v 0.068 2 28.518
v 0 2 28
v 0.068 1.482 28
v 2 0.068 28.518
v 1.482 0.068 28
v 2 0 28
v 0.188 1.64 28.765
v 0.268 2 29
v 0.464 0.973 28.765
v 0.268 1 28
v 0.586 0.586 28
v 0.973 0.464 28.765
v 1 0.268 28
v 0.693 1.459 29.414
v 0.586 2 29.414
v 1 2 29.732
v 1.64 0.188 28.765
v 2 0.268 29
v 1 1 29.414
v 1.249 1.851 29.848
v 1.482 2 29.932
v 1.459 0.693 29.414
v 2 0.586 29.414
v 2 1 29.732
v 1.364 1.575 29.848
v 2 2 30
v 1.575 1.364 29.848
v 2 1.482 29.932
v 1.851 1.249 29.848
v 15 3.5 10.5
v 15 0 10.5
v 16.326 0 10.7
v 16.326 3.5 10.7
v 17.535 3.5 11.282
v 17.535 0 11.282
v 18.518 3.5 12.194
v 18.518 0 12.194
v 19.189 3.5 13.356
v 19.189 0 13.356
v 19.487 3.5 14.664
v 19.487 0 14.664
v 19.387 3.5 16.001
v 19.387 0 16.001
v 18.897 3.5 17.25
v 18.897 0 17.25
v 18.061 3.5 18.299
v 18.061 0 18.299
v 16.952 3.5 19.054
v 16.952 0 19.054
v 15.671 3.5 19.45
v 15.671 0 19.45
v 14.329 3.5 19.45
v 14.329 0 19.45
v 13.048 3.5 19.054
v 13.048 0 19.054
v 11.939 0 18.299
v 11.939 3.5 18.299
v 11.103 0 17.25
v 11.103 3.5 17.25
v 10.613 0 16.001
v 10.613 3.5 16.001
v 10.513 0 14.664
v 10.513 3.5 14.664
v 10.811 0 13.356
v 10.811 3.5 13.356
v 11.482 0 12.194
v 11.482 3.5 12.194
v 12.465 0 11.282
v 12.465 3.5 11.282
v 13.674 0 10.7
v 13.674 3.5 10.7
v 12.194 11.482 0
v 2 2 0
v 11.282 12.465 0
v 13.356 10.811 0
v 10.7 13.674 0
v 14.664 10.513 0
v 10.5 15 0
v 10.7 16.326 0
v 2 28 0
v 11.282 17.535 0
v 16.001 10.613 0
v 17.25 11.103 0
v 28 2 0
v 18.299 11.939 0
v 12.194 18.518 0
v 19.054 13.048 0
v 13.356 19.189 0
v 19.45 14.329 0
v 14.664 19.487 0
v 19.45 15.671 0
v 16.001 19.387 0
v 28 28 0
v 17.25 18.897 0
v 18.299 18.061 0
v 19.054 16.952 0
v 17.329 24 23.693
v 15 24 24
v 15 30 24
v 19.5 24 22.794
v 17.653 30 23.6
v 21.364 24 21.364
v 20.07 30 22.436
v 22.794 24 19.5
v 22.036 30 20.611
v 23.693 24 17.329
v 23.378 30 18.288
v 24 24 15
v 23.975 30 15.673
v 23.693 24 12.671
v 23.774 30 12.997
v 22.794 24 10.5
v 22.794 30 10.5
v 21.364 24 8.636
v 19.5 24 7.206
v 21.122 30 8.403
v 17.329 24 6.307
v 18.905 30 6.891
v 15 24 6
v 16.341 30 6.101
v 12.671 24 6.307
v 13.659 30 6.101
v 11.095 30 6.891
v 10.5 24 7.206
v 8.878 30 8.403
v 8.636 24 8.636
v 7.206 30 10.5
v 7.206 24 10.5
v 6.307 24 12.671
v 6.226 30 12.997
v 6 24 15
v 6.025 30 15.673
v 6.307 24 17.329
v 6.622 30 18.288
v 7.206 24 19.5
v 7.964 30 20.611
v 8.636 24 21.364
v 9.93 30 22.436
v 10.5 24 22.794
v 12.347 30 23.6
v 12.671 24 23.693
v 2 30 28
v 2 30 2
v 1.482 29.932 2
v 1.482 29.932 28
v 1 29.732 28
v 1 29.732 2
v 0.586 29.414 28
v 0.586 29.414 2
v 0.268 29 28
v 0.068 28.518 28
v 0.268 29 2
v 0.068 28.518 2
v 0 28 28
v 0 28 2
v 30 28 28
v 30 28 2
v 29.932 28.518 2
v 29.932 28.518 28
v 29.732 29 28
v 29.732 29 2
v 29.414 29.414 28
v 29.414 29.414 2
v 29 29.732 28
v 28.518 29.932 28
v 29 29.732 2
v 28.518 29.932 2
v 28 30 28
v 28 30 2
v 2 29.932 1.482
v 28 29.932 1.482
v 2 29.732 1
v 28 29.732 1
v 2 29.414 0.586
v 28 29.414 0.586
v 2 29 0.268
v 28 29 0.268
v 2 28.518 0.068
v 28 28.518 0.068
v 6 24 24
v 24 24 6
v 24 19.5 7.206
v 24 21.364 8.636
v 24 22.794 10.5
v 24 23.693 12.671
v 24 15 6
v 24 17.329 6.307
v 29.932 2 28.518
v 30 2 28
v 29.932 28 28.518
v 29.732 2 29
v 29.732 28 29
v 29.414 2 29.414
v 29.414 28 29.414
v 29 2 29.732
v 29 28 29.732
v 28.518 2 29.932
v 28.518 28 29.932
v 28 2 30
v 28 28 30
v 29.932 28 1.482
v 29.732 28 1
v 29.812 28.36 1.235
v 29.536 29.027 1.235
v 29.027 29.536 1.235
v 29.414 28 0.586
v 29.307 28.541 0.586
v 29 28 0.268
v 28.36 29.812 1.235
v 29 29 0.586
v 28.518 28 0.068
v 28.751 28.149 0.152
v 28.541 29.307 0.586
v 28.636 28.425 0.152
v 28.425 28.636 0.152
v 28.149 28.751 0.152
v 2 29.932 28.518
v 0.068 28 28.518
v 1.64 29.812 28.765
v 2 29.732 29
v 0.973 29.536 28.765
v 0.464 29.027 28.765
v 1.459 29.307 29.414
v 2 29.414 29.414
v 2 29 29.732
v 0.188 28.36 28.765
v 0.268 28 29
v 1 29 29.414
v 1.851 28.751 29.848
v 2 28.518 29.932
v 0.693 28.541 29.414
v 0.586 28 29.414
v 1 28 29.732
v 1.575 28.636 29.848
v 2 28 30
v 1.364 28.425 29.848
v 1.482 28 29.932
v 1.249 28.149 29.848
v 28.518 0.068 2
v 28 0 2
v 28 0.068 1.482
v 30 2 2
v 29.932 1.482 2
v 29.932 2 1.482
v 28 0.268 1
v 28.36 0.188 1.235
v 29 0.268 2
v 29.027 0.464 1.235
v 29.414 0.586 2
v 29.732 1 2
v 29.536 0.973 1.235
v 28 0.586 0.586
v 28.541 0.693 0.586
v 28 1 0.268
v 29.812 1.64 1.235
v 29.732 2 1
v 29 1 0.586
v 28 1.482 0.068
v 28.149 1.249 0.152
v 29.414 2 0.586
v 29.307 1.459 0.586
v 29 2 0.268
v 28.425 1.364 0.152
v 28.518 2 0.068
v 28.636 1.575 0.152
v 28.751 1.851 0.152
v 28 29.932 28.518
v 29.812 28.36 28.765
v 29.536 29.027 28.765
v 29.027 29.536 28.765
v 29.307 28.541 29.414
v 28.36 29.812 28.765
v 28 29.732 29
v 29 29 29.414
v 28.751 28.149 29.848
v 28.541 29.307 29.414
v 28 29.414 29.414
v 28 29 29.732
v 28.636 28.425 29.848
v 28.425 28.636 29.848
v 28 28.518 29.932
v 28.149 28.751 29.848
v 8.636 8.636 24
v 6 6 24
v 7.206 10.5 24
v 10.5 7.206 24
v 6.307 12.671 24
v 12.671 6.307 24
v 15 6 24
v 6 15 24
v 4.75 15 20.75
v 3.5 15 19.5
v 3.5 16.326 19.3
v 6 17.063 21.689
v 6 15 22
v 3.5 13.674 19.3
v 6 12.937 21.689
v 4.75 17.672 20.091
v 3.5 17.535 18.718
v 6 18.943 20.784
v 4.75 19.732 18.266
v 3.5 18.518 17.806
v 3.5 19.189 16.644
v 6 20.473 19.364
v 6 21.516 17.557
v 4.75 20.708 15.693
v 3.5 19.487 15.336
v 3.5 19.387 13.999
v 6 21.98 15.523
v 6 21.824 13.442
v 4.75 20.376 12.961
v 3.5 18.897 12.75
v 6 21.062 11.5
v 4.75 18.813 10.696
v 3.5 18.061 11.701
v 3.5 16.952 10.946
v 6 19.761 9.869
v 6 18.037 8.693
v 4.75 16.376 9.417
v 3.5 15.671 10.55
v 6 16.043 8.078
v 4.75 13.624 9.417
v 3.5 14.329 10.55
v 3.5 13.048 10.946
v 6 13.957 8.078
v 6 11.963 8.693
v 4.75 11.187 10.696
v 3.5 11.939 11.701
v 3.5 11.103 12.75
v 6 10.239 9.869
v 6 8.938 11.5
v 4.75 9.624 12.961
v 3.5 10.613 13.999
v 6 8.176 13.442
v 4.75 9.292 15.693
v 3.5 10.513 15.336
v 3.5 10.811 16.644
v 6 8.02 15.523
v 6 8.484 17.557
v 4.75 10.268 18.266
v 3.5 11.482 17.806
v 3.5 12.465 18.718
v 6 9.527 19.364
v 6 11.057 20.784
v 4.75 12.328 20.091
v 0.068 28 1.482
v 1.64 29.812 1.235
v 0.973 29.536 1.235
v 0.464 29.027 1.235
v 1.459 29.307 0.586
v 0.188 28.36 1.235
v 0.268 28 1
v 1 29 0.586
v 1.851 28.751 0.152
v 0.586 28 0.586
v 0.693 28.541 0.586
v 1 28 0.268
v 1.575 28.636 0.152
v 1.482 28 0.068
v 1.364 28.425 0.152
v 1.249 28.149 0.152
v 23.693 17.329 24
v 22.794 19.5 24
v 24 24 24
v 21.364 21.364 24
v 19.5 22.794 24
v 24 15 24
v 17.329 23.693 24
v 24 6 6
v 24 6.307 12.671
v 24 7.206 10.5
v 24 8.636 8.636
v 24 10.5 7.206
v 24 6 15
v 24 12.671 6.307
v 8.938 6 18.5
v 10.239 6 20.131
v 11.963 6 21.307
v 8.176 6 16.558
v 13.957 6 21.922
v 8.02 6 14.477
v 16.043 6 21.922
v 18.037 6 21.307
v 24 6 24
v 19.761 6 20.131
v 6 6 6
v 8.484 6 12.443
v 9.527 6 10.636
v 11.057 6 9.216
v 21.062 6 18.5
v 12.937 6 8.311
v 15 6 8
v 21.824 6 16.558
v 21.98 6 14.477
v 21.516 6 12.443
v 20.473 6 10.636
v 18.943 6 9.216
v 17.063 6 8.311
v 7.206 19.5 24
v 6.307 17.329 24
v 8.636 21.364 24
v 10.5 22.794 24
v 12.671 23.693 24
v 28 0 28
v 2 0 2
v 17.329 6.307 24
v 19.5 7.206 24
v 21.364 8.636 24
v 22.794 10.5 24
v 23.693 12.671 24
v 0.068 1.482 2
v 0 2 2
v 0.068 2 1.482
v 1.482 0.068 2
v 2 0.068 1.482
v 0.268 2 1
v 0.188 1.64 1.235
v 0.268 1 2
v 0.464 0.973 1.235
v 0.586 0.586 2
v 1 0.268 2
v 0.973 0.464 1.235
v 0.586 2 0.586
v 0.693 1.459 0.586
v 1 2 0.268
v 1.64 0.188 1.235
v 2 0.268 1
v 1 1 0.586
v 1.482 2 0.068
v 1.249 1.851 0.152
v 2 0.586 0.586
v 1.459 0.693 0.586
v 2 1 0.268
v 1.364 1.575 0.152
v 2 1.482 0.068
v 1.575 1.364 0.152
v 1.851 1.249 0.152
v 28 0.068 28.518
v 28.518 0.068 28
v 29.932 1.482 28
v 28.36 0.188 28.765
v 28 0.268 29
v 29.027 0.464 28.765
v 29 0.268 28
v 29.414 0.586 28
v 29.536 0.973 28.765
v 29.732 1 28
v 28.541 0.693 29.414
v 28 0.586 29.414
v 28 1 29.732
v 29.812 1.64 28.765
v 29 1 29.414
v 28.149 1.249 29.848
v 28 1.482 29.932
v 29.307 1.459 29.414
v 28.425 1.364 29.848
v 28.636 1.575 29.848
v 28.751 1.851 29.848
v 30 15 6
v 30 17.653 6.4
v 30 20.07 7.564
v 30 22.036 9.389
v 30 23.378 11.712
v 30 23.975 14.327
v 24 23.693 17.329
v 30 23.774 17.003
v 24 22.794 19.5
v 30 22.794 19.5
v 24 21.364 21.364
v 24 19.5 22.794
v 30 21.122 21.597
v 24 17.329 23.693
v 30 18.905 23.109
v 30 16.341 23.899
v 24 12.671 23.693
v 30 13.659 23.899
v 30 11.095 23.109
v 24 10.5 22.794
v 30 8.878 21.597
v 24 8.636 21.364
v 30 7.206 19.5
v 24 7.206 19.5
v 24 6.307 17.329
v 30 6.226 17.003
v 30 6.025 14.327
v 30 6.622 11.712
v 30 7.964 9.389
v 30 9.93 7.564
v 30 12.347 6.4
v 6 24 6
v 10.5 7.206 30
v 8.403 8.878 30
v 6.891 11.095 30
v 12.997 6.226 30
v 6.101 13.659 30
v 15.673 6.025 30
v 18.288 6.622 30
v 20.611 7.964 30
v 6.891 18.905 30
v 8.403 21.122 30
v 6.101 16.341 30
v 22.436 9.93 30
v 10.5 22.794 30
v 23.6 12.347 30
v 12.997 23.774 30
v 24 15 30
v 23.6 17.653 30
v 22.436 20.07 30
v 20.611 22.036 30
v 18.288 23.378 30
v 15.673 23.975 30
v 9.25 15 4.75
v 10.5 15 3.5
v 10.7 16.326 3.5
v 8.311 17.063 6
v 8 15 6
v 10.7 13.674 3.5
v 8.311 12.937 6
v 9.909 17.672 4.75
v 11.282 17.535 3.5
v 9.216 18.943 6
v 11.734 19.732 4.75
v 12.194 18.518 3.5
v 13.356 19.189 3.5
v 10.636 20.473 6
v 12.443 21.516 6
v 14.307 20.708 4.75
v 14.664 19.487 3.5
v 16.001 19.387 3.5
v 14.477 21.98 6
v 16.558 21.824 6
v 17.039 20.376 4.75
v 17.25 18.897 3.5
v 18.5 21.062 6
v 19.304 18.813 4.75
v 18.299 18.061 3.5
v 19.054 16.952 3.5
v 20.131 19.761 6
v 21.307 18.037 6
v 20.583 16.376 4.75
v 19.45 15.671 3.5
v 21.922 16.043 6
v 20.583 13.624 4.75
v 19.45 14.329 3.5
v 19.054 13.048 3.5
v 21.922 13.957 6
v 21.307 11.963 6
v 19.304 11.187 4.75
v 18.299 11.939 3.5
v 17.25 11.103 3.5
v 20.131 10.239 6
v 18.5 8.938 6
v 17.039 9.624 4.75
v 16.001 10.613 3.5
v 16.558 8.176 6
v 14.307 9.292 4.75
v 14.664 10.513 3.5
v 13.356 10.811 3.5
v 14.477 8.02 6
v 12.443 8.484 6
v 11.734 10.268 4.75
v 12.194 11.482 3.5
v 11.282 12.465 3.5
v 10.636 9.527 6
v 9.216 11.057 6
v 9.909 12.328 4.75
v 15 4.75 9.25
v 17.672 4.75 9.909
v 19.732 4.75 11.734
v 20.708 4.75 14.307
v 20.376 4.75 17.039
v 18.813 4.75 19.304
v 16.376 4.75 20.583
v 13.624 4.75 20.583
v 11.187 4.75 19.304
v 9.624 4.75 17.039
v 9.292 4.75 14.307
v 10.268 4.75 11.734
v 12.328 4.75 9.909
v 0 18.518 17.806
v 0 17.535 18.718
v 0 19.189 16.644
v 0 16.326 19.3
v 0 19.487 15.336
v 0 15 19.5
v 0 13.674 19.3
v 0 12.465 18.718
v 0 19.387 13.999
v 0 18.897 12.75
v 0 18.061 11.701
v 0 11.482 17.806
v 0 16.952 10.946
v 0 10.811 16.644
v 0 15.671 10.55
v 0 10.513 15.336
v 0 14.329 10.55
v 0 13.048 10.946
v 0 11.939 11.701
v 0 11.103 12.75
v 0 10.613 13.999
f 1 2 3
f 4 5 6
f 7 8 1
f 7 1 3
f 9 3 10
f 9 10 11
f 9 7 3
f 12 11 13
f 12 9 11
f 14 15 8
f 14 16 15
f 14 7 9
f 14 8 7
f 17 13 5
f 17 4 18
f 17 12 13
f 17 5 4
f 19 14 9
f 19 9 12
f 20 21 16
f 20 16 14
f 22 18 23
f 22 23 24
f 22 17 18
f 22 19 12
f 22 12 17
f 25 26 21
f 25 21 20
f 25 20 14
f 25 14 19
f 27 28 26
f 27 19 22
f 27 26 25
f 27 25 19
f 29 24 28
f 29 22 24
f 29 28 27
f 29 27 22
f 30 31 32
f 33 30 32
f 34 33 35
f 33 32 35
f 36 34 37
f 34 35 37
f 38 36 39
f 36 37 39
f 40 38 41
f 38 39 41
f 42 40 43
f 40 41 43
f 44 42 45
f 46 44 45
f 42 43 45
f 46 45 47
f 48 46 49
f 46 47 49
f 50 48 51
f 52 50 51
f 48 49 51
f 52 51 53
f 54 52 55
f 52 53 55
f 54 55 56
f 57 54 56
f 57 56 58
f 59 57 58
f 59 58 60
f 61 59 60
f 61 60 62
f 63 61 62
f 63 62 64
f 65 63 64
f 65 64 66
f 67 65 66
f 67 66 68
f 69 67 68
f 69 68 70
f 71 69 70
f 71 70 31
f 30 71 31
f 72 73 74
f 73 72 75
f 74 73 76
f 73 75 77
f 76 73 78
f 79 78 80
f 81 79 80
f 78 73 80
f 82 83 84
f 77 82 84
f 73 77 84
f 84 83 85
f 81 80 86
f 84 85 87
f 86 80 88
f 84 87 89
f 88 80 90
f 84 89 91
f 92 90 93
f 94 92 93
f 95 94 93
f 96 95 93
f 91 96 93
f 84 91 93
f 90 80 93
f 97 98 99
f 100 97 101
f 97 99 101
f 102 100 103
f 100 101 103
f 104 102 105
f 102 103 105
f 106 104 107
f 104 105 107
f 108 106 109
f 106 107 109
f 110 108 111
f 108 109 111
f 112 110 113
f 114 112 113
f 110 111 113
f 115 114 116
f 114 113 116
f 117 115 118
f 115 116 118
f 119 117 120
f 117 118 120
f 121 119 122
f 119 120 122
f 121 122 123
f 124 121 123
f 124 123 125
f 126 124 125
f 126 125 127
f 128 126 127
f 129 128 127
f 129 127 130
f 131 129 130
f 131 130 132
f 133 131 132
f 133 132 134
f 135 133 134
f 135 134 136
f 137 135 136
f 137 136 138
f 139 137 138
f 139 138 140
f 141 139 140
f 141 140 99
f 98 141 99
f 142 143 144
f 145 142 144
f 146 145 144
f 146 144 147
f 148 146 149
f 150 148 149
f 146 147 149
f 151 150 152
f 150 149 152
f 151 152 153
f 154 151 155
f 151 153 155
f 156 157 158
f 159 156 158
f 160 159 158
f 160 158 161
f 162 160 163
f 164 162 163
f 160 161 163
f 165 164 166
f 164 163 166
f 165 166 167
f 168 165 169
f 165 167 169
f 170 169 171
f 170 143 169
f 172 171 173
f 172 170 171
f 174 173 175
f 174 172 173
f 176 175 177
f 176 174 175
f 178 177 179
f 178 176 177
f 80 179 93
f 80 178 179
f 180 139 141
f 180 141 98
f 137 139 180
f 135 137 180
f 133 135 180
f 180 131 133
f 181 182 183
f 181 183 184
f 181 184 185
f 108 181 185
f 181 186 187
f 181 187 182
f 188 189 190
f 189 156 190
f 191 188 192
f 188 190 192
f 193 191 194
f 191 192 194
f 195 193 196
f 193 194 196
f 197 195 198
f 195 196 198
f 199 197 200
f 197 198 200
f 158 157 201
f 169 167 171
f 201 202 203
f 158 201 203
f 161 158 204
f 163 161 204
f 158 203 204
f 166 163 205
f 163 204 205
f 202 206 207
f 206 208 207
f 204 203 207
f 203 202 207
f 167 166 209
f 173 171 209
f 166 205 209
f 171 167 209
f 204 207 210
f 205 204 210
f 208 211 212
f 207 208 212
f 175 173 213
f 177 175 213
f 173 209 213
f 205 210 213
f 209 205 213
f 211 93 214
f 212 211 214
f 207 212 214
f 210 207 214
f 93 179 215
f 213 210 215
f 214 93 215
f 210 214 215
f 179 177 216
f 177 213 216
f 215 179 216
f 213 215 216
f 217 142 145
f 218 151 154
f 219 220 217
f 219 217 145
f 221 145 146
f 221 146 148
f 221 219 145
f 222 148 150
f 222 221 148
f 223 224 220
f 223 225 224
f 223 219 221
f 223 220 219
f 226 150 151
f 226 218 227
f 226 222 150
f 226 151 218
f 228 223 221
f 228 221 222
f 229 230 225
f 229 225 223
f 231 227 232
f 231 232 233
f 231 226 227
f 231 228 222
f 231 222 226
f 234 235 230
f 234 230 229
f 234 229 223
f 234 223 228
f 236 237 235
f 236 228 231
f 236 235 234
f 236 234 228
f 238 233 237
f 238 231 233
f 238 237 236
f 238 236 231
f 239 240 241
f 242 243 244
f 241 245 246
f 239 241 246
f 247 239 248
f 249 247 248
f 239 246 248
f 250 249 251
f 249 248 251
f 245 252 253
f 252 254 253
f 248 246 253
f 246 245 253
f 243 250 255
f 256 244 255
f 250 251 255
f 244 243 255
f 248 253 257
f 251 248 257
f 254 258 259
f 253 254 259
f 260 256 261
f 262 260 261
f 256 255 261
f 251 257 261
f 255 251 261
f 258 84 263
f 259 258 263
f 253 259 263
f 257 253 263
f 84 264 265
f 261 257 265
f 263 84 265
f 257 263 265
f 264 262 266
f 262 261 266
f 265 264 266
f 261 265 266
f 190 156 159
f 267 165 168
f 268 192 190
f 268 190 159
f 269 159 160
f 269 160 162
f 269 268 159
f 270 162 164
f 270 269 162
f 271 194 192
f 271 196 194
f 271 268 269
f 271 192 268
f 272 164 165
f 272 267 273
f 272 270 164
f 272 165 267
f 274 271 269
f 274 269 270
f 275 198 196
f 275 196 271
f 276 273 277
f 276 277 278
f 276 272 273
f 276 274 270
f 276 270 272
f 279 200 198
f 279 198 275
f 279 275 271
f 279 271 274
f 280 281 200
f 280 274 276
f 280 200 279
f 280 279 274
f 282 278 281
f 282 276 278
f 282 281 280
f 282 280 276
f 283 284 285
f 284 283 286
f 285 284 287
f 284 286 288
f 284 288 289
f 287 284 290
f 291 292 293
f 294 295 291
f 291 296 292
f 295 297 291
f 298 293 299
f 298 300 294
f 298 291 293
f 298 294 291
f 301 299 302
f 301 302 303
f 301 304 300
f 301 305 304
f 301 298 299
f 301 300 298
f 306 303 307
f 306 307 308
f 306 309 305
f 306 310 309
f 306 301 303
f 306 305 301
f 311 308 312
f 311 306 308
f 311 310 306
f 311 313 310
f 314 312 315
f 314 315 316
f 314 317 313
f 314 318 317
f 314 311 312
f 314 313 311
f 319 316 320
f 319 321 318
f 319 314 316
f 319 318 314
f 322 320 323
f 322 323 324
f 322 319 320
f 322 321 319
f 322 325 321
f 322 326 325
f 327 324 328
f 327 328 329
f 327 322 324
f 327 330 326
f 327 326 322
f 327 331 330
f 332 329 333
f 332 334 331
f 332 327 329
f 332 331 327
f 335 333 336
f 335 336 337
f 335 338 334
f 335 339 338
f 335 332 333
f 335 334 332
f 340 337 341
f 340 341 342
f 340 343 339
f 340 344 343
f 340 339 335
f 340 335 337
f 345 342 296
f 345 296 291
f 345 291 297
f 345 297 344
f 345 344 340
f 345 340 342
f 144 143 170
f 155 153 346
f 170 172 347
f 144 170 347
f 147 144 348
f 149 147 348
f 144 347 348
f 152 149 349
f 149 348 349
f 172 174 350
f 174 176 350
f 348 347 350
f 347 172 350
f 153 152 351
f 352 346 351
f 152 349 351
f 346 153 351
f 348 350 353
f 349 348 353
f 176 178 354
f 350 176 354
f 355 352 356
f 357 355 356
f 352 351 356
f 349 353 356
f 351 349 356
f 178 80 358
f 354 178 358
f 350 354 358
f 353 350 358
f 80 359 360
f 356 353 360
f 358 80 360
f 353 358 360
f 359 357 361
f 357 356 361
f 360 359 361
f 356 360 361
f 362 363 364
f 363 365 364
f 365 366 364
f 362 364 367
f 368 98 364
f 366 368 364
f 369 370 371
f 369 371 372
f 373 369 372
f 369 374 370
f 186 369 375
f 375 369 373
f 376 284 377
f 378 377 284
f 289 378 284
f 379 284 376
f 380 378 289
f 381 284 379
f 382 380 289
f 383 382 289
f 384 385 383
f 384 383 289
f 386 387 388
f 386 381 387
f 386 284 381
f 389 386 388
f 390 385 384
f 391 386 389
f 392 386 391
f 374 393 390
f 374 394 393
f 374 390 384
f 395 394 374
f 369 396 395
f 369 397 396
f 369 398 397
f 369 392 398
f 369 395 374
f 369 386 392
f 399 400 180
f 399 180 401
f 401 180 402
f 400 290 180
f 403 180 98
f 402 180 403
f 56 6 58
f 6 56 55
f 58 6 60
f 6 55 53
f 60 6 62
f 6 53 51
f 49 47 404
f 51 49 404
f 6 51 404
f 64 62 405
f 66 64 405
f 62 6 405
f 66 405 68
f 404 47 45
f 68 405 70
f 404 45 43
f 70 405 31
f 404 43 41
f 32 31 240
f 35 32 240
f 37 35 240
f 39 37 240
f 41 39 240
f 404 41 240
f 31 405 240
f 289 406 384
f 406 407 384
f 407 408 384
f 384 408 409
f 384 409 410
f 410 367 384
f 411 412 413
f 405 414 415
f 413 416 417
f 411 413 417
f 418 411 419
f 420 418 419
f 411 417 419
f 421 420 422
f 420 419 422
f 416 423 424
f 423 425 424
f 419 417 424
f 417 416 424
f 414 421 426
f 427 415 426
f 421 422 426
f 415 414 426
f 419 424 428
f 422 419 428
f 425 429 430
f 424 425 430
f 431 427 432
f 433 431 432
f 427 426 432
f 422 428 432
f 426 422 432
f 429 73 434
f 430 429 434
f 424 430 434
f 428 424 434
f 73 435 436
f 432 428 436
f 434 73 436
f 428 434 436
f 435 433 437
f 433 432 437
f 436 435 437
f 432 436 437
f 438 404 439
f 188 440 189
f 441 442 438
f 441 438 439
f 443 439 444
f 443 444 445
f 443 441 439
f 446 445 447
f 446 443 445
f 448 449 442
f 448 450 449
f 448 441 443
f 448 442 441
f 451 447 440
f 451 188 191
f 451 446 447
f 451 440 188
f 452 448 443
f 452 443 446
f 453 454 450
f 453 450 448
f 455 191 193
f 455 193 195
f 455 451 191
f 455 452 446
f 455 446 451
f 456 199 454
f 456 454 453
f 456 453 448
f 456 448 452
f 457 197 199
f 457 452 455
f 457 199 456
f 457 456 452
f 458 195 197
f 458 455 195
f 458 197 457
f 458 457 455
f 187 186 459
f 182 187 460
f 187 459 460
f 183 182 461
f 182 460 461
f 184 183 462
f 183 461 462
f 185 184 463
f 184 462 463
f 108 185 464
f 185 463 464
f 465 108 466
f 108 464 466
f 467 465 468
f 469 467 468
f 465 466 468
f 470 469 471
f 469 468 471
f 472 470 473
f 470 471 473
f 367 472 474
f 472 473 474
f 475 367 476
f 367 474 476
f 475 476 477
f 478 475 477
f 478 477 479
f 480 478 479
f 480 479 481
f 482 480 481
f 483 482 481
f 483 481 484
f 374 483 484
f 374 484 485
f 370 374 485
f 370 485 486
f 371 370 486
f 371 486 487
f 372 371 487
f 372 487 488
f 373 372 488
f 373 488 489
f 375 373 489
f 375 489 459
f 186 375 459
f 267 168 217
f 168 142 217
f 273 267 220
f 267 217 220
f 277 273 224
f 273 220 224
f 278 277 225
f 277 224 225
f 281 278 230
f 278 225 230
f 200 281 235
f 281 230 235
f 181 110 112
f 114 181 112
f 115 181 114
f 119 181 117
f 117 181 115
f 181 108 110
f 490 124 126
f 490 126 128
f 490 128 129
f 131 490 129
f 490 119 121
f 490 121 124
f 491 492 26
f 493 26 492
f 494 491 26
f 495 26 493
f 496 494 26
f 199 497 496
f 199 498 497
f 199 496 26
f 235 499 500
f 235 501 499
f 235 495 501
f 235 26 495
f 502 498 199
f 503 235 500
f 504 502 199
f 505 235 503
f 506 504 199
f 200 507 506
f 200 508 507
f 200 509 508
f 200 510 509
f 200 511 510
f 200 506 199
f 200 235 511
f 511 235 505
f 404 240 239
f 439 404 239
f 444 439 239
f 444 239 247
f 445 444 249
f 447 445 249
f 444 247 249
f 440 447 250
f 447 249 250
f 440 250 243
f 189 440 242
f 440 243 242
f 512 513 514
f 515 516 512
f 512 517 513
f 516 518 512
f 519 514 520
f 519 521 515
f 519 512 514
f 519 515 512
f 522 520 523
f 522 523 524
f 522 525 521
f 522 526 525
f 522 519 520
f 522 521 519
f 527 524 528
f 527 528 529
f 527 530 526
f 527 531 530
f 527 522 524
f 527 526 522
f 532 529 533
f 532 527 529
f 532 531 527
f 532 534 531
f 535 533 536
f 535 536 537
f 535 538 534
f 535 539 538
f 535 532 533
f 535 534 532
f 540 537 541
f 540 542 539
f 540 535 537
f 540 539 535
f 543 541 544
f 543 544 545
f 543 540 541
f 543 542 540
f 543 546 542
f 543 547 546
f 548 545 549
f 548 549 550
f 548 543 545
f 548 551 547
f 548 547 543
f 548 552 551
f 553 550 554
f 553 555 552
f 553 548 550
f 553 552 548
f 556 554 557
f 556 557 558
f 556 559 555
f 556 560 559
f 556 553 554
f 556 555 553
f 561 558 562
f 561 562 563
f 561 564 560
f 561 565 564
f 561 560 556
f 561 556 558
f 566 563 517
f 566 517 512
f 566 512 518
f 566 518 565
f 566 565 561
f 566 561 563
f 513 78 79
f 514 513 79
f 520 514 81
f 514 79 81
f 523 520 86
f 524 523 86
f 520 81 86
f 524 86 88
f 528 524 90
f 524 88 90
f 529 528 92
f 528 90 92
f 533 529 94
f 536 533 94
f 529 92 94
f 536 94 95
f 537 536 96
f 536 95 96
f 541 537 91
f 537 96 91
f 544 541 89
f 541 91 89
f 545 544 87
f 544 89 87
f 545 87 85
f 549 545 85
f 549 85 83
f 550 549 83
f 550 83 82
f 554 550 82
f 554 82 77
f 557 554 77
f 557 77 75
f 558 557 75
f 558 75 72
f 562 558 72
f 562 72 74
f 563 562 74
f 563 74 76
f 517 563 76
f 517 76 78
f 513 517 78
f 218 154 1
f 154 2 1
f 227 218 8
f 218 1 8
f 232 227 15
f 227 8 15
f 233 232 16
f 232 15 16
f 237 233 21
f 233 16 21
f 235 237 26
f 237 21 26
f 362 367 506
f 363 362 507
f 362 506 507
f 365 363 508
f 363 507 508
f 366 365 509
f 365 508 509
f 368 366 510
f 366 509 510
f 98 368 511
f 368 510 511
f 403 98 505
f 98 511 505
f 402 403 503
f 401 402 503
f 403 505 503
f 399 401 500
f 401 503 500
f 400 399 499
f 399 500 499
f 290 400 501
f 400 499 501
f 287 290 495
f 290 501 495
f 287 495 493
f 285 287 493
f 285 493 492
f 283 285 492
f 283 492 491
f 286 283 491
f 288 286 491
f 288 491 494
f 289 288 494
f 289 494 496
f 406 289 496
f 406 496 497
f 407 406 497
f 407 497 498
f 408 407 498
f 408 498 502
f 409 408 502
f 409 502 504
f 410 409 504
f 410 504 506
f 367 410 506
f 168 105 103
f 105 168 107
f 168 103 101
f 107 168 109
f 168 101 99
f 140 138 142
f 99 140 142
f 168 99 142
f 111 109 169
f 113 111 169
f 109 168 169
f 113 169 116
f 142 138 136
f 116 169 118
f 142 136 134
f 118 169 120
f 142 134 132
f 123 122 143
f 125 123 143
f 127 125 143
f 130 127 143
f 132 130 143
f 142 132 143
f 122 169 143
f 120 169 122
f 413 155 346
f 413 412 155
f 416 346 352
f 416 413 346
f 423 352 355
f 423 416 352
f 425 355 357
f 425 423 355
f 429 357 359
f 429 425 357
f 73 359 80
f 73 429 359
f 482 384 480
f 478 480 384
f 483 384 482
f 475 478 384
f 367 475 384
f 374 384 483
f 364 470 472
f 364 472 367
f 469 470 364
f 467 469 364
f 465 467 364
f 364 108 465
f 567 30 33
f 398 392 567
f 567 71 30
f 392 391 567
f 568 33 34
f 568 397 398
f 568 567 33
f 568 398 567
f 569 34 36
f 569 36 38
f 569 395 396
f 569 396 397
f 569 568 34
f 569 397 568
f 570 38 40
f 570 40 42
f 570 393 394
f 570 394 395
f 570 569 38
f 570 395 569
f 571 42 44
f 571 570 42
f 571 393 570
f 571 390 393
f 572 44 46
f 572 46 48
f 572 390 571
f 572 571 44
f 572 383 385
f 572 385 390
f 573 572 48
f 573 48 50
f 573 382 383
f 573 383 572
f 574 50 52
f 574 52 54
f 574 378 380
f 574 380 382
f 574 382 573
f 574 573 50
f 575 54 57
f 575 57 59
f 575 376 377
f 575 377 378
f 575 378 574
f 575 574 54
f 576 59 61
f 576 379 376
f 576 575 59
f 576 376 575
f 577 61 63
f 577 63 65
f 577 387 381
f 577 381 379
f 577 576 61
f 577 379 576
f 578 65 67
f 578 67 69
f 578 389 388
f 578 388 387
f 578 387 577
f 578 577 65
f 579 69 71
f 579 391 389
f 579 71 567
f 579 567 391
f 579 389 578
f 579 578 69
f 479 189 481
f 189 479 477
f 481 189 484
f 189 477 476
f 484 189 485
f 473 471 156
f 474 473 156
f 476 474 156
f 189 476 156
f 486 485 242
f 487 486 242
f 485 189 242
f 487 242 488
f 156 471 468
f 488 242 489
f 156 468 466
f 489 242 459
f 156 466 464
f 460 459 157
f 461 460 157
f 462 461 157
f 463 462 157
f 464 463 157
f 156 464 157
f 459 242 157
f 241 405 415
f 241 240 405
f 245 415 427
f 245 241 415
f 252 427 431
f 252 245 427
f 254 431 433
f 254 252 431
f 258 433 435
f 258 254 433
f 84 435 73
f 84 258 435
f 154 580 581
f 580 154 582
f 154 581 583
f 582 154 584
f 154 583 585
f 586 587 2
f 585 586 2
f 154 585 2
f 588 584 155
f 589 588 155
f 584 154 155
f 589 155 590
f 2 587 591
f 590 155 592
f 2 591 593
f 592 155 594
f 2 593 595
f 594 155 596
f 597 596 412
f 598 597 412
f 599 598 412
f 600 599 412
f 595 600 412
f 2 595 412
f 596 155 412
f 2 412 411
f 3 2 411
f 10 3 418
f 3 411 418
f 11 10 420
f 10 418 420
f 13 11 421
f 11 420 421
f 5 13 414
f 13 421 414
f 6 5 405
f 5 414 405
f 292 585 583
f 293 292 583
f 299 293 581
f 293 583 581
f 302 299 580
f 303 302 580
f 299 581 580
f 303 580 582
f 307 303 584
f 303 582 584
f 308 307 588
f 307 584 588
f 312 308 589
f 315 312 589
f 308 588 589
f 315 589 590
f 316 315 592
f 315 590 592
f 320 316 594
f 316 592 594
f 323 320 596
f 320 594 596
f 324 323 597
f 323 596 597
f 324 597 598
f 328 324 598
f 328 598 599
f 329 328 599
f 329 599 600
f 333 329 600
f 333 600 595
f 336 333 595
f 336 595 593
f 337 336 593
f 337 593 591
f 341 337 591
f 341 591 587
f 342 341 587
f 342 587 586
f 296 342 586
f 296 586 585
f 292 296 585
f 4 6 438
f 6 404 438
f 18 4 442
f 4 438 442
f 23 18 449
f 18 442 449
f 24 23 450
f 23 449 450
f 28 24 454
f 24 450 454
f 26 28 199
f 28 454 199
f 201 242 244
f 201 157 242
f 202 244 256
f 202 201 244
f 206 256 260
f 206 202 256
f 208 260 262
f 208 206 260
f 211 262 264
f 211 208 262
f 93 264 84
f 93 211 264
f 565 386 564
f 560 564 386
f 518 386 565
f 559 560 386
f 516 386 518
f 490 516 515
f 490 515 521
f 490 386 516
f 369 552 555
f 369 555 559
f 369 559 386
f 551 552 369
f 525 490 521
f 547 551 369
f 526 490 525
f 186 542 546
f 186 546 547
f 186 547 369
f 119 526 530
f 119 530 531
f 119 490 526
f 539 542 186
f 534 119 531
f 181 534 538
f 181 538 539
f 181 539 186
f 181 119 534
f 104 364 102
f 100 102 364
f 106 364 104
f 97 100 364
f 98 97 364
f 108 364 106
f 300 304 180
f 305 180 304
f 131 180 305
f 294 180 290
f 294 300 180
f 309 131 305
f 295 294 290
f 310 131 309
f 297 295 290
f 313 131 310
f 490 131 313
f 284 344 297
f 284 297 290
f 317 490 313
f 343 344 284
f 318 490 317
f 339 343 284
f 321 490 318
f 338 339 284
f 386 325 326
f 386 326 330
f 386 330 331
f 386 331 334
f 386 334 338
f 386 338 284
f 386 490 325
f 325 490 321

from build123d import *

# Parameters (mm, degrees)
BOSS_EXTRUDE1_DEPTH = 30
FILLET1_R           = 2
SHELL2_T            = 6
SKETCH3_R           = 9
CUT_EXTRUDE1_DEPTH  = 10
SKETCH4_R           = 9
CUT_EXTRUDE2_DEPTH  = 10
SKETCH5_R           = 9
CUT_EXTRUDE3_DEPTH  = 10
SKETCH7_R           = 4.5
CUT_EXTRUDE4_DEPTH  = 10
SKETCH8_R           = 4.5
CUT_EXTRUDE5_DEPTH  = 10
SKETCH9_R           = 4.5
CUT_EXTRUDE6_DEPTH  = 10
CHAMFER2_SIZE       = 2.5


with BuildPart() as part:
    # Sketch1 → Boss-Extrude1 (new body)
    with BuildSketch(Plane.XY):
        with BuildLine():
            Line((2, 0), (28, 0))
            ThreePointArc((28, 0), (29.414213562, 0.585786438), (30, 2))
            Line((30, 2), (30, 28))
            ThreePointArc((30, 28), (29.414213562, 29.414213562), (28, 30))
            Line((28, 30), (2, 30))
            ThreePointArc((2, 30), (0.585786438, 29.414213562), (0, 28))
            Line((0, 28), (0, 2))
            ThreePointArc((0, 2), (0.585786438, 0.585786438), (2, 0))
        make_face()
    extrude(amount=BOSS_EXTRUDE1_DEPTH)

    # Fillet1
    fillet1_edges = [part.edges().sort_by_distance(p)[0] for p in [
        (29.414213562, 0.585786438, 30),
        (15, 0, 0),
        (0.585786438, 0.585786438, 0),
        (30, 15, 30),
        (29.414213562, 29.414213562, 30),
        (15, 30, 30),
        (0.585786438, 29.414213562, 30),
        (0, 15, 30),
        (0.585786438, 0.585786438, 30),
        (15, 0, 30),
        (0, 15, 0),
        (0.585786438, 29.414213562, 0),
        (15, 30, 0),
        (29.414213562, 29.414213562, 0),
        (30, 15, 0),
        (29.414213562, 0.585786438, 0),
    ]]
    fillet(fillet1_edges, radius=FILLET1_R)

    # Shell2 (no face opened: a closed hollow body)
    add(offset(amount=-SHELL2_T, mode=Mode.PRIVATE), mode=Mode.SUBTRACT)

    # Sketch3 → Cut-Extrude1 (cut)
    with BuildSketch(Plane.XY.offset(30)):
        with Locations((15, 15)):
            Circle(SKETCH3_R)
    extrude(amount=-CUT_EXTRUDE1_DEPTH, mode=Mode.SUBTRACT)

    # Sketch4 → Cut-Extrude2 (cut)
    with BuildSketch(Plane(origin=(30, 0, 0), x_dir=(0, 0, -1), z_dir=(1, 0, 0))):
        with Locations((-15, 15)):
            Circle(SKETCH4_R)
    extrude(amount=-CUT_EXTRUDE2_DEPTH, mode=Mode.SUBTRACT)

    # Sketch5 → Cut-Extrude3 (cut)
    with BuildSketch(Plane(origin=(0, 30, 0), x_dir=(1, 0, 0), z_dir=(0, 1, 0))):
        with Locations(Location((15, -15, 0), (0, 0, 270))):
            Circle(SKETCH5_R)
    extrude(amount=-CUT_EXTRUDE3_DEPTH, mode=Mode.SUBTRACT)

    # Sketch7 → Cut-Extrude4 (cut)
    with BuildSketch(Plane.ZY):
        with Locations((15, 15)):
            Circle(SKETCH7_R)
    extrude(amount=-CUT_EXTRUDE4_DEPTH, mode=Mode.SUBTRACT)

    # Sketch8 → Cut-Extrude5 (cut)
    with BuildSketch(Plane(origin=(0, 0, 0), x_dir=(-1, 0, 0), z_dir=(0, 0, -1))):
        with Locations((-15, 15)):
            Circle(SKETCH8_R)
    extrude(amount=-CUT_EXTRUDE5_DEPTH, mode=Mode.SUBTRACT)

    # Sketch9 → Cut-Extrude6 (cut)
    with BuildSketch(Plane.XZ):
        with Locations(Location((15, 15, 0), (0, 0, 270))):
            Circle(SKETCH9_R)
    extrude(amount=-CUT_EXTRUDE6_DEPTH, mode=Mode.SUBTRACT)

    # Chamfer2
    # the kernel refuses this chamfer: 2.5 mm, written as the material it takes off along each edge
    with BuildSketch(Plane(origin=(6, 15, 15), x_dir=(0, 0, 1), z_dir=(0, -1, 0))) as chamfer2_piece_1:
        Polygon((4.5, CHAMFER2_SIZE), (4.5 + CHAMFER2_SIZE, 0), (4.5, 0), align=None)
    revolve(axis=Axis((6, 15, 15), (-1, 0, 0)), mode=Mode.SUBTRACT)
    with BuildSketch(Plane(origin=(15, 15, 6), x_dir=(-1, 0, 0), z_dir=(0, -1, 0))) as chamfer2_piece_2:
        Polygon((4.5, CHAMFER2_SIZE), (4.5 + CHAMFER2_SIZE, 0), (4.5, 0), align=None)
    revolve(axis=Axis((15, 15, 6), (0, 0, -1)), mode=Mode.SUBTRACT)
    with BuildSketch(Plane(origin=(15, 6, 15), x_dir=(0, 0, -1), z_dir=(-1, 0, 0))) as chamfer2_piece_3:
        Polygon((4.5, CHAMFER2_SIZE), (4.5 + CHAMFER2_SIZE, 0), (4.5, 0), align=None)
    revolve(axis=Axis((15, 6, 15), (0, -1, 0)), mode=Mode.SUBTRACT)


solid = part.part
